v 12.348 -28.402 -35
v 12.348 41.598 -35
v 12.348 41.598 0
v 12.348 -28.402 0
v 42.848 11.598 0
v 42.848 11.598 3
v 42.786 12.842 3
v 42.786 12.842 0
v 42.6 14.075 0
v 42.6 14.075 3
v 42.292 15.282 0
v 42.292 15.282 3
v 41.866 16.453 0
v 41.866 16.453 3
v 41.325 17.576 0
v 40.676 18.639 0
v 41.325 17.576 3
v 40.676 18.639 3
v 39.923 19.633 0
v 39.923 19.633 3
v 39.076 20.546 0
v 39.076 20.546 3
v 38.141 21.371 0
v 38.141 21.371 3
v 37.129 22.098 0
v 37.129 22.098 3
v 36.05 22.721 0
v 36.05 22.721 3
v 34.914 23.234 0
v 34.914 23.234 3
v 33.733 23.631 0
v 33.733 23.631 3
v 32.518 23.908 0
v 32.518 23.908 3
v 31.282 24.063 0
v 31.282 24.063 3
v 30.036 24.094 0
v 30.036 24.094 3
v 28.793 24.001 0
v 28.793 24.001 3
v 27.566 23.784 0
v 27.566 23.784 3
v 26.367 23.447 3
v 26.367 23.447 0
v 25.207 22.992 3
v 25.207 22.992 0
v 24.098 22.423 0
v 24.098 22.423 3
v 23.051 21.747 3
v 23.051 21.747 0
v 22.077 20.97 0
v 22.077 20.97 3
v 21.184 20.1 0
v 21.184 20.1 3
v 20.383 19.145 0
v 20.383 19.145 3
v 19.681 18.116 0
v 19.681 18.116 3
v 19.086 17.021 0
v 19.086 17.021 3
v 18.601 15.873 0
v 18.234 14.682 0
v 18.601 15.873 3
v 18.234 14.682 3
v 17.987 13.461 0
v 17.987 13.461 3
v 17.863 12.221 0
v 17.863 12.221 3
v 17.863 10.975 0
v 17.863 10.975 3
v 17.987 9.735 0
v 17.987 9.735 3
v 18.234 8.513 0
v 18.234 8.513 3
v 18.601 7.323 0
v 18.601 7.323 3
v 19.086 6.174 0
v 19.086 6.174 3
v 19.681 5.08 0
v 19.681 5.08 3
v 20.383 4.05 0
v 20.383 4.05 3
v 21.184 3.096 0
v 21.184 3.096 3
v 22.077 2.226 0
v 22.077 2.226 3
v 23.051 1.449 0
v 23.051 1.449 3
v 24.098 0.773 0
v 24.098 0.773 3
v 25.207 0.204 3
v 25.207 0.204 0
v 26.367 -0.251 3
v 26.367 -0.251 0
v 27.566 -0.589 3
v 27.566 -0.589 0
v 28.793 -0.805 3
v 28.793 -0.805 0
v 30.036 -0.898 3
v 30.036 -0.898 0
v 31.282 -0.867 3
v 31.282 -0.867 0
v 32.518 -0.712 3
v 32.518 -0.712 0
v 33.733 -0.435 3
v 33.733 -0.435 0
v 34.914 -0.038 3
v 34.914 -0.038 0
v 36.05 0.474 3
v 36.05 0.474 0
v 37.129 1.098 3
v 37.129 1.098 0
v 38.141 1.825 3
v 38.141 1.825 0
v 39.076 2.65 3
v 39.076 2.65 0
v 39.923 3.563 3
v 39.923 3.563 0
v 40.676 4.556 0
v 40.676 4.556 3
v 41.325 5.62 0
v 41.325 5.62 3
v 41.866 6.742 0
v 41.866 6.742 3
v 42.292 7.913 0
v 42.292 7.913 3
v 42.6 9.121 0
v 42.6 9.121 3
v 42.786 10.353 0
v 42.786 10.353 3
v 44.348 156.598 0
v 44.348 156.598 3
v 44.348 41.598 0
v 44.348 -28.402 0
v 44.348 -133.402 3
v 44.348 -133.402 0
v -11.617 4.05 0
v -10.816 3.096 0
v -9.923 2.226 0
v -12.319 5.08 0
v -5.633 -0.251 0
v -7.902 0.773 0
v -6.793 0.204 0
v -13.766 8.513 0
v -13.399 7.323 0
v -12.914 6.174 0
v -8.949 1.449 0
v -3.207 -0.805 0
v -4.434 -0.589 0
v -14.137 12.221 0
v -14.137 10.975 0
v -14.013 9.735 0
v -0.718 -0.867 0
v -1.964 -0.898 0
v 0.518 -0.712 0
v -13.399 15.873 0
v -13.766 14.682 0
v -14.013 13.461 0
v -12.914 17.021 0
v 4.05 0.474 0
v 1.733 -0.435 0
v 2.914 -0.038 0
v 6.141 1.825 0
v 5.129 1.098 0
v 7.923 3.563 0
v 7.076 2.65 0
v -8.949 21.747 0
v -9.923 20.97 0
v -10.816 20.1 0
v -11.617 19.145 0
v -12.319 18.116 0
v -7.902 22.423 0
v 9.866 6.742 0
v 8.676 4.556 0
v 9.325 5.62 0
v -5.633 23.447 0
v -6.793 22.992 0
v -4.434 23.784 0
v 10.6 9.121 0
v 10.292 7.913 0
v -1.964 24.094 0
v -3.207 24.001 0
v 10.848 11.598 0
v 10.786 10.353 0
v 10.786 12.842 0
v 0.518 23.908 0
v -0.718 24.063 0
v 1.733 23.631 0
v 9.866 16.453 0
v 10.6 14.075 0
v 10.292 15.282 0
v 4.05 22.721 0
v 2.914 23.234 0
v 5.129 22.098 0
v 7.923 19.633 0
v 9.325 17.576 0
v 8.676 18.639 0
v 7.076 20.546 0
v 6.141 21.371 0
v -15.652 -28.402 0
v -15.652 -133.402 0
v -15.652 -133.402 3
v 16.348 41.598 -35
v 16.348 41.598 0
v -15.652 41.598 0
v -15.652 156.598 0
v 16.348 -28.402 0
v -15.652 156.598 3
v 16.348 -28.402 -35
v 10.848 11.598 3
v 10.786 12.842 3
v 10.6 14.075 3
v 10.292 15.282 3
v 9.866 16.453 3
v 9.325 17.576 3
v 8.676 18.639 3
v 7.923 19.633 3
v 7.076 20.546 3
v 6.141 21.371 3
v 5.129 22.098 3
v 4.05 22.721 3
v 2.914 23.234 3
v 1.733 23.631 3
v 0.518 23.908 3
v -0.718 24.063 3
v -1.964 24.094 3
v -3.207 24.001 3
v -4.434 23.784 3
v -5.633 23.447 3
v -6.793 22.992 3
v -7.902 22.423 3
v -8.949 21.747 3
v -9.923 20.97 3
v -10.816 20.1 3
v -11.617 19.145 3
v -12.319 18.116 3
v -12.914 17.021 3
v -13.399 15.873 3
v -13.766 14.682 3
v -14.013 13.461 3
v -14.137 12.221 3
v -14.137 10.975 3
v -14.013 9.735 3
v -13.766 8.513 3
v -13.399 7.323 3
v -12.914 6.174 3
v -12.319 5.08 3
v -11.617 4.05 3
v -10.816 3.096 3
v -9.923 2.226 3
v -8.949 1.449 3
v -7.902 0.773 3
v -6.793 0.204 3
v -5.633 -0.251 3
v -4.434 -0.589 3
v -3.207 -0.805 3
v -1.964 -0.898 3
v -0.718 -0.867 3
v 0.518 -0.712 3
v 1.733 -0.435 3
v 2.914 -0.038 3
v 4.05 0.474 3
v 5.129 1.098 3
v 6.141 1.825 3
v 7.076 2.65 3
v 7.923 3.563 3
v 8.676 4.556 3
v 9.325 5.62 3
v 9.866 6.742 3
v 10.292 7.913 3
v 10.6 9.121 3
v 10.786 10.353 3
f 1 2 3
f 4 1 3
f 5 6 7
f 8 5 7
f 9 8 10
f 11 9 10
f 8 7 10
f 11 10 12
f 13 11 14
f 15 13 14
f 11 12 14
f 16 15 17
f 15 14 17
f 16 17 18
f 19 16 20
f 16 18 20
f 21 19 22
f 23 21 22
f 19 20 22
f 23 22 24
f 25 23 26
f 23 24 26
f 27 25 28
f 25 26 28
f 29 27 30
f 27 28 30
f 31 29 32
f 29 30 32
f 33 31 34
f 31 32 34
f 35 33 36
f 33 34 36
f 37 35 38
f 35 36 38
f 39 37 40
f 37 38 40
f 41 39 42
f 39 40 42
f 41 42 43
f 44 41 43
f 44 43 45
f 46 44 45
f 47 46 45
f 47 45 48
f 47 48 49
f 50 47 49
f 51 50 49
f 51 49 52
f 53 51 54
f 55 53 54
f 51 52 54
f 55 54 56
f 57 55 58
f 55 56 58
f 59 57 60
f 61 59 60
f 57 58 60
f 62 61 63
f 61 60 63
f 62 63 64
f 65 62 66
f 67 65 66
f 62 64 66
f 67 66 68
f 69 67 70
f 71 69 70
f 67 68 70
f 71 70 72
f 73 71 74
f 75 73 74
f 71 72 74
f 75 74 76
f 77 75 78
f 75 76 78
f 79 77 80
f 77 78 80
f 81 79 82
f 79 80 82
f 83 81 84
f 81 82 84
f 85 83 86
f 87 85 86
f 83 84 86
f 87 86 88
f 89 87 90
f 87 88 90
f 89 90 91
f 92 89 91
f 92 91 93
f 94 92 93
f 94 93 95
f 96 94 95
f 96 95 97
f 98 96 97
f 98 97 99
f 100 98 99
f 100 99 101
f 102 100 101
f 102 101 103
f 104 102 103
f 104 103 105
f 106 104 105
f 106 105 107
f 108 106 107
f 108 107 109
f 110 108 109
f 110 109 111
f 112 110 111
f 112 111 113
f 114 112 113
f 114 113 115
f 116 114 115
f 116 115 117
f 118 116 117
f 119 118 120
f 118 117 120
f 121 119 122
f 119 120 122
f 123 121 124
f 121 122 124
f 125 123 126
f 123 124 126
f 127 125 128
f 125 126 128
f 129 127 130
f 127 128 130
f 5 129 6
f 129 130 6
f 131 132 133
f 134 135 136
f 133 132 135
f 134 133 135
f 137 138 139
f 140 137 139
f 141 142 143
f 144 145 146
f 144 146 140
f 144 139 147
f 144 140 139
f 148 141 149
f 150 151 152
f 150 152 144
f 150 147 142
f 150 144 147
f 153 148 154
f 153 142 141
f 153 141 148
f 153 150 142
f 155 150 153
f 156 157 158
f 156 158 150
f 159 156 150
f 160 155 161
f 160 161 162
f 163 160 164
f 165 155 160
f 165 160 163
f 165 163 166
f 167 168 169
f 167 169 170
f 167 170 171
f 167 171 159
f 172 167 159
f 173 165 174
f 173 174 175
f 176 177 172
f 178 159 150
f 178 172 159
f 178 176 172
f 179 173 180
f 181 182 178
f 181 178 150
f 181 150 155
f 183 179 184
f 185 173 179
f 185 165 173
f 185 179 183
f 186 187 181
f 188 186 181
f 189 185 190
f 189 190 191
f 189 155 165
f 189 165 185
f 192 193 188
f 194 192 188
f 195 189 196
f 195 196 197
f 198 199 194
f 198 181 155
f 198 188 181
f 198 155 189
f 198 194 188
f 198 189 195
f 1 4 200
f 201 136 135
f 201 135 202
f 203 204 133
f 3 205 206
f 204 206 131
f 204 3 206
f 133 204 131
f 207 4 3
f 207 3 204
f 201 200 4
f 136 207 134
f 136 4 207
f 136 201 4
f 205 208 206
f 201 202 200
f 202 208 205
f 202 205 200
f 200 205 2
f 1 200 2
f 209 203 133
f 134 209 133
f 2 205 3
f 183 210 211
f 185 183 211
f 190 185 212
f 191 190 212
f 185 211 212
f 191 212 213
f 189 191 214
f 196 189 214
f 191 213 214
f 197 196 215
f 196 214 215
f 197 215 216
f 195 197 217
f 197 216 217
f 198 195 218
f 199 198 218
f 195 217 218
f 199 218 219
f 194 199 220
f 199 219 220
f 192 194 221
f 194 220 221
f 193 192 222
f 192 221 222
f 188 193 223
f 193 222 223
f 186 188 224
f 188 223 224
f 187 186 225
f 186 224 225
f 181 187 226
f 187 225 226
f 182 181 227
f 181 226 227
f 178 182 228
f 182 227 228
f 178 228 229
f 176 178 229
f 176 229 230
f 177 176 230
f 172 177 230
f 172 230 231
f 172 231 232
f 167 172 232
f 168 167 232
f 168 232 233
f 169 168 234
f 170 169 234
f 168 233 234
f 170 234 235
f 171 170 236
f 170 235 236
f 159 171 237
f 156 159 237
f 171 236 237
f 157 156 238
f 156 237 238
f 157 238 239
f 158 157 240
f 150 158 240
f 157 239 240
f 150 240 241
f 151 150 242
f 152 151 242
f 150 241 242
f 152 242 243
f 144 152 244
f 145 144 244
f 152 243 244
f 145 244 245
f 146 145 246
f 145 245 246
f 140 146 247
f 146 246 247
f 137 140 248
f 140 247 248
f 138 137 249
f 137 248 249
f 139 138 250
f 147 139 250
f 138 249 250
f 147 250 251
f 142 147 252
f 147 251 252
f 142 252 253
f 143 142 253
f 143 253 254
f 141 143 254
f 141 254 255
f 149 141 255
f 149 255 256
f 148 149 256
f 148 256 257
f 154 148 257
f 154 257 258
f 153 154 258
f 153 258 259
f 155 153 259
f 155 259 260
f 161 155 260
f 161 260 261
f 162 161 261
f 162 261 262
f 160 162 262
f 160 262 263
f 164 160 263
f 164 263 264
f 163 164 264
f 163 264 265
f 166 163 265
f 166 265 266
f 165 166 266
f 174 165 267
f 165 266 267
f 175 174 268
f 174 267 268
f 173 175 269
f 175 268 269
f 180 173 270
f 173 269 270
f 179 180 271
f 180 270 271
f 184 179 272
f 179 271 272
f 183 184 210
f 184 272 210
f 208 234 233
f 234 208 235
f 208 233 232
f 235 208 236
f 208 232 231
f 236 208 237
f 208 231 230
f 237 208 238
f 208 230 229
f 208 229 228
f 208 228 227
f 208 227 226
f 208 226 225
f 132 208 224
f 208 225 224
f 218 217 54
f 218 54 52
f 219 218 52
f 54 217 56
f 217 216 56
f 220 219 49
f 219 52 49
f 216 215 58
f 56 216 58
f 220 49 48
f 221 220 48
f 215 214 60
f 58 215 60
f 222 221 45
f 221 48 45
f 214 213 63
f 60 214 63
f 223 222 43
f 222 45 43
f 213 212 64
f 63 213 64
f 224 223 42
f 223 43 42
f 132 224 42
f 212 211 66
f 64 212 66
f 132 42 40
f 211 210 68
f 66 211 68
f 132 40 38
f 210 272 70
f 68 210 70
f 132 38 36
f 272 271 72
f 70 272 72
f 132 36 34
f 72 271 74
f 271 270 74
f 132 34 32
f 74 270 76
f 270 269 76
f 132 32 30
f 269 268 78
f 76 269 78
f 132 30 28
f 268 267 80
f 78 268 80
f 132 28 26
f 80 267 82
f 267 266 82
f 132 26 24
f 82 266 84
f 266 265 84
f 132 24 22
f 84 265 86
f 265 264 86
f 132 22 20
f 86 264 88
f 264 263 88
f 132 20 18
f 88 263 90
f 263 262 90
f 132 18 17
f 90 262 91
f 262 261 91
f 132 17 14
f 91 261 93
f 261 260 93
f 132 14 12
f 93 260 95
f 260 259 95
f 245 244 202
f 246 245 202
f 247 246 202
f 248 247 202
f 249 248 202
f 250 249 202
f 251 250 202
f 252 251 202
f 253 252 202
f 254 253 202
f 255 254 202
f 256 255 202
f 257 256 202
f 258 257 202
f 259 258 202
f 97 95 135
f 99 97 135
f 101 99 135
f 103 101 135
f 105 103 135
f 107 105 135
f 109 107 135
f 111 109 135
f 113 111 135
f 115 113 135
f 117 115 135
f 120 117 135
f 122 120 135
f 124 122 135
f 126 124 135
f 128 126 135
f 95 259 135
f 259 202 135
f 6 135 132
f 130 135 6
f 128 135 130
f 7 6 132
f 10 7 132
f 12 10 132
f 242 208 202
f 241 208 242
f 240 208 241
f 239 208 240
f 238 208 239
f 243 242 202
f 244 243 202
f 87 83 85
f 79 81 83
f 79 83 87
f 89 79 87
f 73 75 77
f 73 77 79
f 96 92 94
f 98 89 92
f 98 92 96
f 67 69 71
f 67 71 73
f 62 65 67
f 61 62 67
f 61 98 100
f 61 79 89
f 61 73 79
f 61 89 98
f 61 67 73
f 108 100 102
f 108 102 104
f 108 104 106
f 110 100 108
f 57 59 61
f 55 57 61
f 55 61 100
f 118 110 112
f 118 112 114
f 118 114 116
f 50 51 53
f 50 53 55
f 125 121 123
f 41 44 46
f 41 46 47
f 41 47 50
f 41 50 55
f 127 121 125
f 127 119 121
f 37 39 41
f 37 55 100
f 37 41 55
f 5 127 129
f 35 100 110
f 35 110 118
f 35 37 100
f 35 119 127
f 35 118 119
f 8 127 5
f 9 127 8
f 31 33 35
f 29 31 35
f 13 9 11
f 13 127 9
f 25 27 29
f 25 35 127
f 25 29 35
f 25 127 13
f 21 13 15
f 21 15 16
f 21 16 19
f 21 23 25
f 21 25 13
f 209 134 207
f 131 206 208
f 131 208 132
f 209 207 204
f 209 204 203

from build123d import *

# Parameters (mm, degrees)
SKETCH_1_W          = 60
SKETCH_1_H          = 60
EXTRUDE_1_DEPTH     = 3
SKETCH_2_W          = 28
SKETCH_2_H          = 60
EXTRUDE_2_DEPTH     = 35
CUT_EXTRUDE_1_DEPTH = 60
SKETCH_4_R          = 12.5
CUT_EXTRUDE_2_DEPTH = 3
EXTRUDE_3_DEPTH     = 110
EXTRUDE_4_DEPTH     = 110
CUT_EXTRUDE_3_DEPTH = 100
CUT_EXTRUDE_5_DEPTH = 110
SKETCH_12_W         = 60
SKETCH_12_H         = 3
EXTRUDE_5_DEPTH     = 5
SKETCH_13_W         = 60
SKETCH_13_H         = 3
EXTRUDE_6_DEPTH     = 5


with BuildPart() as part:
    # 草图1 → 凸台-拉伸1 (new body)
    with BuildSketch(Plane.XY):
        with Locations((14.347634014, 11.597850928)):
            Rectangle(SKETCH_1_W, SKETCH_1_H)
    extrude(amount=EXTRUDE_1_DEPTH)

    # 草图2 → 凸台-拉伸2 (add)
    with BuildSketch(Plane(origin=(0, 0, 0), x_dir=(-1, 0, 0), z_dir=(0, 0, -1))):
        with Locations((-30.347634014, 11.597850928)):
            Rectangle(SKETCH_2_W, SKETCH_2_H)
        with Locations((1.652365986, 11.597850928)):
            Rectangle(SKETCH_2_W, SKETCH_2_H)
    extrude(amount=EXTRUDE_2_DEPTH)

    # 草图3 → 切除-拉伸1 (cut)
    with BuildSketch(Plane(origin=(0, 41.597850928, 0), x_dir=(1, 0, 0), z_dir=(0, 1, 0))):
        Polygon((16.347634014, 35), (44.347634014, 0), (44.347634014, 35), align=None)
        Polygon((12.347634014, 35), (-15.652365986, 0), (-15.652365986, 35), align=None)
    extrude(amount=-CUT_EXTRUDE_1_DEPTH, mode=Mode.SUBTRACT)

    # 草图4 → 切除-拉伸2 (cut)
    with BuildSketch(Plane.XY.offset(3)):
        with Locations((-1.652365986, 11.597850928)):
            Circle(SKETCH_4_R)
        with Locations((30.347634014, 11.597850928)):
            Circle(SKETCH_4_R)
    extrude(amount=-CUT_EXTRUDE_2_DEPTH, mode=Mode.SUBTRACT)

    # 草图5 → 凸台-拉伸3 (add)
    with BuildSketch(Plane(origin=(0, 41.597850928, 0), x_dir=(1, 0, 0), z_dir=(0, 1, 0))):
        Polygon((12.347634014, 35), (12.347634014, 0), (16.347634014, 0), (16.347634014, 20), (44.347634014, 0), (44.347634014, -3), (-15.652365986, -3), (-15.652365986, 0), align=None)
    extrude(amount=EXTRUDE_3_DEPTH)

    # 草图6 → 凸台-拉伸4 (add)
    with BuildSketch(Plane.XZ.offset(18.402149072)):
        Polygon((-15.652365986, 3), (-15.652365986, 0), (12.347634014, -35), (12.347634014, 0), (16.347634014, 0), (16.347634014, -35), (44.347634014, 0), (44.347634014, 3), align=None)
    extrude(amount=EXTRUDE_4_DEPTH)

    # 草图7 → 切除-拉伸3 (cut)
    with BuildSketch(Plane.XZ.offset(128.402149072)):
        Polygon((44.347634014, 0), (16.347634014, -35), (16.347634014, 0), align=None)
        Polygon((12.347634014, -35), (-15.652365986, 0), (12.347634014, 0), align=None)
    extrude(amount=-CUT_EXTRUDE_3_DEPTH, mode=Mode.SUBTRACT)

    # 草图9 → 切除-拉伸5 (cut)
    with BuildSketch(Plane(origin=(0, 151.597850928, 0), x_dir=(1, 0, 0), z_dir=(0, 1, 0))):
        Polygon((-15.652365986, 0), (12.347634014, 0), (12.347634014, 35), align=None)
        Polygon((16.347634014, 0), (44.347634014, 0), (16.347634014, 20), align=None)
    extrude(amount=-CUT_EXTRUDE_5_DEPTH, mode=Mode.SUBTRACT)

    # 草图12 → 凸台-拉伸5 (add)
    with BuildSketch(Plane(origin=(0, -128.402149072, 0), x_dir=(-1, 0, 0), z_dir=(0, -1, 0))):
        with Locations((-14.347634014, -1.5)):
            Rectangle(SKETCH_12_W, SKETCH_12_H)
    extrude(amount=EXTRUDE_5_DEPTH)

    # 草图13 → 凸台-拉伸6 (add)
    with BuildSketch(Plane(origin=(0, 151.597850928, 0), x_dir=(1, 0, 0), z_dir=(0, 1, 0))):
        with Locations((14.347634014, -1.5)):
            Rectangle(SKETCH_13_W, SKETCH_13_H)
    extrude(amount=EXTRUDE_6_DEPTH)


solid = part.part
